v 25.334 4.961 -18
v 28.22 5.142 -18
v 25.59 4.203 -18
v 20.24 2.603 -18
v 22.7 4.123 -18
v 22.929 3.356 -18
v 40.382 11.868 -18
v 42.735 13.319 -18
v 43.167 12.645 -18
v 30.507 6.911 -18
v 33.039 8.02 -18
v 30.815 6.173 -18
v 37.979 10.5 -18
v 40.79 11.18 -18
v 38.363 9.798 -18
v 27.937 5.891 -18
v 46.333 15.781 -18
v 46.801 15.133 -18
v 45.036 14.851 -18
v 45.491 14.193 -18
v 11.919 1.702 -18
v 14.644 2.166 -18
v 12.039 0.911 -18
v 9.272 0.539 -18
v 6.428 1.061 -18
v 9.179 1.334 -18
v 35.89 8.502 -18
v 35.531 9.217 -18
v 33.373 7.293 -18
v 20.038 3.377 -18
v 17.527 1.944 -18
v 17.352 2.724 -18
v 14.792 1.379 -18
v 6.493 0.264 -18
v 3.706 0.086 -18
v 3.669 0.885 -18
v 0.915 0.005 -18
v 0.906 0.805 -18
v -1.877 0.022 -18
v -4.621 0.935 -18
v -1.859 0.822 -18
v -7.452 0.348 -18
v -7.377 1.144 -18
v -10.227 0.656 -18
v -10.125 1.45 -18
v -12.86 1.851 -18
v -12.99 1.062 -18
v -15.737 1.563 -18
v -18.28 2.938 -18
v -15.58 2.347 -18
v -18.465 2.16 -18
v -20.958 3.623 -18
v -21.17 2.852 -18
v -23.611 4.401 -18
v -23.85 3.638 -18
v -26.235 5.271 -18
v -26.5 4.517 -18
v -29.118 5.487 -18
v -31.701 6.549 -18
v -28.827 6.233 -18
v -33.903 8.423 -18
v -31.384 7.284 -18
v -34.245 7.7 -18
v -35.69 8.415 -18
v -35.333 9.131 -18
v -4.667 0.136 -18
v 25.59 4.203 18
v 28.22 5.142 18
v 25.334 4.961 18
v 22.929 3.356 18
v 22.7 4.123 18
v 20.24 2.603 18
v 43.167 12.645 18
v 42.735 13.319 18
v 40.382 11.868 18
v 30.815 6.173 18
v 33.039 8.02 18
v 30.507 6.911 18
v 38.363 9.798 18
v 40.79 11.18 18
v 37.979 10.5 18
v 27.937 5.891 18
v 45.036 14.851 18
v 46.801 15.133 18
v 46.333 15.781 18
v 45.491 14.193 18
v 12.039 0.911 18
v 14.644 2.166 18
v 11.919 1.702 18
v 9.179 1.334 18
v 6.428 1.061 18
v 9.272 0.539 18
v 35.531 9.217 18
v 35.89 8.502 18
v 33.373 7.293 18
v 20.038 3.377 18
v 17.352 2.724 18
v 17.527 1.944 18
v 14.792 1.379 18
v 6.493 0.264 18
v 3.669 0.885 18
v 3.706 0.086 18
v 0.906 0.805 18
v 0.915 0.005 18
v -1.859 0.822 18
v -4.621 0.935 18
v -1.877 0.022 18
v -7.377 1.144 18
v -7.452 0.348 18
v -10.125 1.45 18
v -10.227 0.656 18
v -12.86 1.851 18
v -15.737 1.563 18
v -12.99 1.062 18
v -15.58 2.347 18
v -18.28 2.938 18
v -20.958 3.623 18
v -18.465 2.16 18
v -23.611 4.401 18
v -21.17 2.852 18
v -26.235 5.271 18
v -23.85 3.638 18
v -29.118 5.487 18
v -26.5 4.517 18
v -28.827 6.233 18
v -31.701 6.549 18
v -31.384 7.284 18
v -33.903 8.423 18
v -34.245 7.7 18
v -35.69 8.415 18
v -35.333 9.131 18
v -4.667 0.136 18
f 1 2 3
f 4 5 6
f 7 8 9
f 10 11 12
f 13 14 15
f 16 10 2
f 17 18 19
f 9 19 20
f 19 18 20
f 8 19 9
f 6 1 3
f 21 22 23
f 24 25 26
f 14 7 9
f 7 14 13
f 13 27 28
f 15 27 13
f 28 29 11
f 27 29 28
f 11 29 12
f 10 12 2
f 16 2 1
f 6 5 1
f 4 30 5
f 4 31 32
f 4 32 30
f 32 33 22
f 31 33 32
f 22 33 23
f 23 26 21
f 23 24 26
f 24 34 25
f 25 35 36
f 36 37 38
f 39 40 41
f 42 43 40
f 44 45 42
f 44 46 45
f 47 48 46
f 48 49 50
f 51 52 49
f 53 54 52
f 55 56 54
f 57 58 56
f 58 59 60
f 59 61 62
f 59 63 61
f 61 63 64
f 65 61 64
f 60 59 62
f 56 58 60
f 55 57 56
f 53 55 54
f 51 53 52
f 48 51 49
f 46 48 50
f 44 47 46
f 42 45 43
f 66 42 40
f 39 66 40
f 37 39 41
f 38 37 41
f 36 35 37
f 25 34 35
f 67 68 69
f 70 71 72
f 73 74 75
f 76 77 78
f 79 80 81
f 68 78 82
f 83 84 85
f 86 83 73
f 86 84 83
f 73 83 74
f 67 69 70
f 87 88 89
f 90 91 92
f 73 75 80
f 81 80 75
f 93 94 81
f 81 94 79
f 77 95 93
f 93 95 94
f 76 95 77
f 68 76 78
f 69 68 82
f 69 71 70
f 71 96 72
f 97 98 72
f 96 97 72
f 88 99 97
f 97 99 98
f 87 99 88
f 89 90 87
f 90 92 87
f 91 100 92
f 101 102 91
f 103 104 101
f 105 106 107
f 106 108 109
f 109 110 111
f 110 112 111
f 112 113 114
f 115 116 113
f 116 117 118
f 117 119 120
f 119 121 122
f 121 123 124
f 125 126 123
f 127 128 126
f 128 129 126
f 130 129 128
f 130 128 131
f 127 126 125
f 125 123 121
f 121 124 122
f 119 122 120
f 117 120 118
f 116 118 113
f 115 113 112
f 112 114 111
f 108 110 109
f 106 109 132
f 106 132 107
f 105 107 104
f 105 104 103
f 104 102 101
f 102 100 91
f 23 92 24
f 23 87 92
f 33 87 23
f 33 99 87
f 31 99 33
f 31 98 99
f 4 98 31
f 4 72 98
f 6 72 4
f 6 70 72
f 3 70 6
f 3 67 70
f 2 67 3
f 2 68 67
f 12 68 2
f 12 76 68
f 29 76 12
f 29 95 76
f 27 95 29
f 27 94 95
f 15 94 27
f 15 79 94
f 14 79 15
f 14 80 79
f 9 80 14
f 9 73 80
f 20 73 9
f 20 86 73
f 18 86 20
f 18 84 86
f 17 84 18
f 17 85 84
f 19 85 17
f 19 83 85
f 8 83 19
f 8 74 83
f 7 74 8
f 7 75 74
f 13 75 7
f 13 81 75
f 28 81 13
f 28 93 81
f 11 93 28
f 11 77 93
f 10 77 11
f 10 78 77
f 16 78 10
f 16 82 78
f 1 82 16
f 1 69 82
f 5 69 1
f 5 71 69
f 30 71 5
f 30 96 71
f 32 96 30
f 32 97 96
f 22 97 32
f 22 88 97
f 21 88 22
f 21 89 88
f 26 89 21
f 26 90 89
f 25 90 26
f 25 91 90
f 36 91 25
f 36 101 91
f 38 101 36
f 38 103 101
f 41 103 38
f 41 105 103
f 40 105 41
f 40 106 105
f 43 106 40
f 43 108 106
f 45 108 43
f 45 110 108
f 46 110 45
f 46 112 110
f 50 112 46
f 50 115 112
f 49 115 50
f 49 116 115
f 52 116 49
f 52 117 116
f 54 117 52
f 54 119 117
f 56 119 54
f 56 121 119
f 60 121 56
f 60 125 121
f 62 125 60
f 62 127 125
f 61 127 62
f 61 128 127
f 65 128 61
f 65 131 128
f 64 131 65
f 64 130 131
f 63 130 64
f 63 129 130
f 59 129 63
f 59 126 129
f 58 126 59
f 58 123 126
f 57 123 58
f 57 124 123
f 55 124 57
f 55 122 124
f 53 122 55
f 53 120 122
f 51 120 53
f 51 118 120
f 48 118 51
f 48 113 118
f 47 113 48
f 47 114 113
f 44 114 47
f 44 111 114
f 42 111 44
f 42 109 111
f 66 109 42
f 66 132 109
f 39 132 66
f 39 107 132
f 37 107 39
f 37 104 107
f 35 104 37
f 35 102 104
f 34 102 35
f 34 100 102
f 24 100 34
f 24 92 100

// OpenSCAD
// file: pn.scad
//$PN_FILTER_LABEL = undef;
module _pn_label(label)
{
	assert(is_string(label), "A string giving the label must be passed to _pn_label");
	assert(is_string($PN_FILTER_LABEL), "_pn_label() should be under a _pn_filter()");

	if($PN_FILTER_LABEL == label) {
		children();
	}
}

module _pn_filter(label)
{
	assert(is_string(label), "A string giving the label must be passed to _pn_filter");

	let($PN_FILTER_LABEL = label) {
		children();
	}
}

module pn_pos()
{
	_pn_label("pos") children();
}

module pn_neg()
{
	_pn_label("neg") children();
}

module pn_posneg()
{
	assert($children == 2, "pn_posneg must have two children");
	_pn_label("pos") children(0);
	_pn_label("neg") children(1);
}

module pn_top()
{
	difference() {
		_pn_filter("pos") children();
		_pn_filter("neg") children();
	}
}

module pn_anchor(name)
{
	_pn_label(str("anchor_", name)) {
		assert($children != 0, str("Children were not passed through to anchor ", name))
		children();
	}
}

module pn_attach(name)
{
	_pn_filter(str("anchor_", name)) children();
}
// file: params.scad
// USED BY MULTIPLE PARTS

$fs = 0.1;
$fa = 2;

// The nominal thickness of the sheet material. Parts will still mate and work properly if they vary from this width (but see INTERCONNECT_BOLT_EXTRA_LENGTH).
THICKNESS = 6; //0.1

THICKNESS_TOLERANCE = 1; //0.1

// The distance between the connection step and the middle of the bolt hole or T-slot on either side.
INTER_CONNECTION_OFFSET = 7;

// The diameter of the bolt holes and minor width of the T-slots
INTERCONNECT_BOLT_DIAMETER = 3;

// The length of the bolts to be used in interconnects between sheet parts. If washers are used, this should be reduced by the washer thickness.
INTERCONNECT_BOLT_LENGTH = 12;

// The extra depth below the nut area of T-slots. This should be at least the length of the taper at the bottom of the bolts, plus the maximum variance of the actual sheet material thickness below the nominal thickness, plus the maximum variance of the bolt length above the nominal length.
INTERCONNECT_BOLT_EXTRA_LENGTH = 3;

// The radius of the strain reliefs in the T-slots
STRAIN_RELIEF_RADIUS = 0.25; //0.01

// The total depth of the T-slot from the opening to the end of the bolt area
T_SLOT_DEPTH = INTERCONNECT_BOLT_LENGTH + INTERCONNECT_BOLT_EXTRA_LENGTH - THICKNESS;

// The width of the T-slot; this should be the width of your nuts
T_SLOT_WIDTH = 6; //0.1

// The width of the bolt area
T_SLOT_MINOR_WIDTH = INTERCONNECT_BOLT_DIAMETER;

// The depth of the nut area of the T-slot; this should be the thickness of your nuts
T_SLOT_NUT_DEPTH = 2; //0.1

// The offset of the nut area below the opening of the T-slot
T_SLOT_NUT_OFFSET = 3; //0.1

// The distance between the outer extents of the front and back legs
SPINES_OUTER_SPACING = 50;


LEG_SLOT_DEPTH = 2;
LEG_SLOT_WIDTH = 2;


// The position of the join point between the inner ribs and the spine, in the plane of the spine
RIB_A_POS = [-45,55];
// The angle in the plane of the spine by which the inner ribs are rolled away from the center
RIB_A_ANGLE = 30;
// The distance by which the inner ribs are shifted backwards from having their lowest point centered between the spines
RIB_A_SHIFT = 0;
// The radius described by the fingerboards on the inner ribs
RIB_A_RADIUS = 80; //5
// The angle by which the fingerboards on the inner ribs are canted away from the user
RIB_A_PITCH = 10;


// The position of the join point between the second ribs and the spine, in the plane of the spine
RIB_B_POS = [-87,35];
// The angle in the plane of the spine by which the second ribs are rolled away from the center
RIB_B_ANGLE = 20;
// The distance by which the second ribs are shifted backwards from having their lowest point centered between the spines
RIB_B_SHIFT = 0;
// The radius described by the fingerboards on the second ribs
RIB_B_RADIUS = 80; //5
// The angle by which the fingerboards on the second ribs are canted away from the user
RIB_B_PITCH = 0;

// The position of the join point between the outer ribs and the spine, in the plane of the spine
RIB_C_POS = [-130,25];
// The angle in the plane of the spine by which the outer ribs are rolled away from the center
RIB_C_ANGLE = 10;
// The distance by which the outer ribs are shifted backwards from having their lowest point centered between the spines
RIB_C_SHIFT = 0;
// The radius described by the fingerboards on the outer ribs
RIB_C_RADIUS = 80; //5
// The angle by which the fingerboards on the outer ribs are canted away from the user
RIB_C_PITCH = 10;

// The angle by which each half of the keyboard is rotated backwards in the horizontal plane
PELVIS_HALF_ANGLE = 20;

// The distance between the pelvis's rear center angle and its outer edges, measured along the spine angles
PELVIS_REAR_HALF_WIDTH = 30; //5

// The height of the bottom bar of the spine
SPINE_BASE_HEIGHT = 20;


CABLE_GUIDE_LENGTH = 7;
CABLE_GUIDE_WIDTH = 1;

STABILIZER_HEIGHT = 8;


RIB_FORWARD_EXTENT = 37;
RIB_REARWARD_EXTENT = 50;
// file: util.scad
include <params.scad>
include <pn.scad>

ANCHOR_TL = 0+0;
ANCHOR_TC = 0+1;
ANCHOR_TR = 0+2;
ANCHOR_CL = 0+3;
ANCHOR_CC = 0+4;
ANCHOR_CR = 0+5;
ANCHOR_BL = 0+6;
ANCHOR_BC = 0+7;
ANCHOR_BR = 0+8;

module Rect(width, height, anchor)
{
    txm = anchor%3 == 0 ? -1 : anchor%3 == 1 ? -0.5 : 0;
    tym = anchor/3 == 0 ? 0 : anchor/3 == 1 ? -0.5 : -1;
    translate([width*txm, height*tym, 0])
        square([width, height], center=false);
}

module TSlot()
{
    EXTRA = 1;
    
    pn_neg() {
        translate([-T_SLOT_MINOR_WIDTH/2, -T_SLOT_DEPTH, 0])
            square([T_SLOT_MINOR_WIDTH, T_SLOT_DEPTH+EXTRA], center=false);
        translate([-T_SLOT_WIDTH/2, -(T_SLOT_NUT_DEPTH+T_SLOT_NUT_OFFSET), 0])
            square([T_SLOT_WIDTH, T_SLOT_NUT_DEPTH], center=false);
        translate([-T_SLOT_WIDTH/2, -T_SLOT_NUT_OFFSET, 0])
            circle(r=STRAIN_RELIEF_RADIUS);
        translate([T_SLOT_WIDTH/2, -T_SLOT_NUT_OFFSET, 0])
            circle(r=STRAIN_RELIEF_RADIUS);
    }
}

module InterconnectBoltHole()
{
    pn_neg() {
        circle(d=INTERCONNECT_BOLT_DIAMETER);
    }
}

module Interconnect(name)
{
    EXTRA = 1;
    pn_neg() {
        translate([-EXTRA, -THICKNESS_TOLERANCE])
            square([EXTRA+2*INTER_CONNECTION_OFFSET, THICKNESS_TOLERANCE+THICKNESS]);
    }

    translate([3*INTER_CONNECTION_OFFSET, THICKNESS/2])
        InterconnectBoltHole();

    translate([INTER_CONNECTION_OFFSET, THICKNESS]) rotate([0,0,180])
        TSlot();

    translate([2*INTER_CONNECTION_OFFSET, THICKNESS/2])
        pn_anchor(name) children();
}

module LegSlot()
{
    EXTRA = 1;

    pn_neg() {
        translate([-LEG_SLOT_WIDTH/2, -LEG_SLOT_DEPTH, 0])
            square([LEG_SLOT_DEPTH,LEG_SLOT_WIDTH+EXTRA], center=false);
    }
}

module Wedge(radius, angle)
{
    intersection() {
        circle(radius);
        polygon(points = [
            [0,0],
            [-radius * tan(angle/2), -radius],
            [radius * tan(angle/2), -radius]
        ]);
    }
}

module CocktailSausage(minorRadius, angle, thickness)
{
    halfRadius = minorRadius + thickness/2;
    difference() {
        Wedge(minorRadius+thickness, angle);
        circle(minorRadius);
    }
}
module Sausage(minorRadius, angle, thickness)
{
    halfRadius = minorRadius + thickness/2;
    difference() {
        union() {
            Wedge(minorRadius+thickness, angle);
            translate([-halfRadius * sin(angle/2), -halfRadius * cos(angle/2), 0])
                circle(d=thickness);
            translate([halfRadius * sin(angle/2), -halfRadius * cos(angle/2), 0])
                circle(d=thickness);
        }
        circle(minorRadius);
    }
}

function angleFromLen(radius, length) = length / radius * 180 / PI;


module CableGuide()
{
    pn_neg() {
        hull() {
            translate([0,CABLE_GUIDE_LENGTH/2])
                circle(d=CABLE_GUIDE_WIDTH);
            translate([0,-CABLE_GUIDE_LENGTH/2])
                circle(d=CABLE_GUIDE_WIDTH);
        }
    }
}
// main file
include <util.scad>
include <params.scad>
include <pn.scad>

PCB_THICKNESS = 0.8;
PCB_WIDTH = 36;

module FingerboardPCB(radius)
{
	EXTRA = 1;

	REAR_ANGLE = angleFromLen(radius, RIB_REARWARD_EXTENT);
	FRONT_ANGLE = angleFromLen(radius, RIB_FORWARD_EXTENT);

	color("#FF9209")
	linear_extrude(PCB_WIDTH, center=true)
	translate([0,radius,0])
	rotate([0,0,REAR_ANGLE/2-FRONT_ANGLE/2])
		CocktailSausage(minorRadius=radius-PCB_THICKNESS, angle=REAR_ANGLE+FRONT_ANGLE, thickness=PCB_THICKNESS);
}

FingerboardPCB(80);
